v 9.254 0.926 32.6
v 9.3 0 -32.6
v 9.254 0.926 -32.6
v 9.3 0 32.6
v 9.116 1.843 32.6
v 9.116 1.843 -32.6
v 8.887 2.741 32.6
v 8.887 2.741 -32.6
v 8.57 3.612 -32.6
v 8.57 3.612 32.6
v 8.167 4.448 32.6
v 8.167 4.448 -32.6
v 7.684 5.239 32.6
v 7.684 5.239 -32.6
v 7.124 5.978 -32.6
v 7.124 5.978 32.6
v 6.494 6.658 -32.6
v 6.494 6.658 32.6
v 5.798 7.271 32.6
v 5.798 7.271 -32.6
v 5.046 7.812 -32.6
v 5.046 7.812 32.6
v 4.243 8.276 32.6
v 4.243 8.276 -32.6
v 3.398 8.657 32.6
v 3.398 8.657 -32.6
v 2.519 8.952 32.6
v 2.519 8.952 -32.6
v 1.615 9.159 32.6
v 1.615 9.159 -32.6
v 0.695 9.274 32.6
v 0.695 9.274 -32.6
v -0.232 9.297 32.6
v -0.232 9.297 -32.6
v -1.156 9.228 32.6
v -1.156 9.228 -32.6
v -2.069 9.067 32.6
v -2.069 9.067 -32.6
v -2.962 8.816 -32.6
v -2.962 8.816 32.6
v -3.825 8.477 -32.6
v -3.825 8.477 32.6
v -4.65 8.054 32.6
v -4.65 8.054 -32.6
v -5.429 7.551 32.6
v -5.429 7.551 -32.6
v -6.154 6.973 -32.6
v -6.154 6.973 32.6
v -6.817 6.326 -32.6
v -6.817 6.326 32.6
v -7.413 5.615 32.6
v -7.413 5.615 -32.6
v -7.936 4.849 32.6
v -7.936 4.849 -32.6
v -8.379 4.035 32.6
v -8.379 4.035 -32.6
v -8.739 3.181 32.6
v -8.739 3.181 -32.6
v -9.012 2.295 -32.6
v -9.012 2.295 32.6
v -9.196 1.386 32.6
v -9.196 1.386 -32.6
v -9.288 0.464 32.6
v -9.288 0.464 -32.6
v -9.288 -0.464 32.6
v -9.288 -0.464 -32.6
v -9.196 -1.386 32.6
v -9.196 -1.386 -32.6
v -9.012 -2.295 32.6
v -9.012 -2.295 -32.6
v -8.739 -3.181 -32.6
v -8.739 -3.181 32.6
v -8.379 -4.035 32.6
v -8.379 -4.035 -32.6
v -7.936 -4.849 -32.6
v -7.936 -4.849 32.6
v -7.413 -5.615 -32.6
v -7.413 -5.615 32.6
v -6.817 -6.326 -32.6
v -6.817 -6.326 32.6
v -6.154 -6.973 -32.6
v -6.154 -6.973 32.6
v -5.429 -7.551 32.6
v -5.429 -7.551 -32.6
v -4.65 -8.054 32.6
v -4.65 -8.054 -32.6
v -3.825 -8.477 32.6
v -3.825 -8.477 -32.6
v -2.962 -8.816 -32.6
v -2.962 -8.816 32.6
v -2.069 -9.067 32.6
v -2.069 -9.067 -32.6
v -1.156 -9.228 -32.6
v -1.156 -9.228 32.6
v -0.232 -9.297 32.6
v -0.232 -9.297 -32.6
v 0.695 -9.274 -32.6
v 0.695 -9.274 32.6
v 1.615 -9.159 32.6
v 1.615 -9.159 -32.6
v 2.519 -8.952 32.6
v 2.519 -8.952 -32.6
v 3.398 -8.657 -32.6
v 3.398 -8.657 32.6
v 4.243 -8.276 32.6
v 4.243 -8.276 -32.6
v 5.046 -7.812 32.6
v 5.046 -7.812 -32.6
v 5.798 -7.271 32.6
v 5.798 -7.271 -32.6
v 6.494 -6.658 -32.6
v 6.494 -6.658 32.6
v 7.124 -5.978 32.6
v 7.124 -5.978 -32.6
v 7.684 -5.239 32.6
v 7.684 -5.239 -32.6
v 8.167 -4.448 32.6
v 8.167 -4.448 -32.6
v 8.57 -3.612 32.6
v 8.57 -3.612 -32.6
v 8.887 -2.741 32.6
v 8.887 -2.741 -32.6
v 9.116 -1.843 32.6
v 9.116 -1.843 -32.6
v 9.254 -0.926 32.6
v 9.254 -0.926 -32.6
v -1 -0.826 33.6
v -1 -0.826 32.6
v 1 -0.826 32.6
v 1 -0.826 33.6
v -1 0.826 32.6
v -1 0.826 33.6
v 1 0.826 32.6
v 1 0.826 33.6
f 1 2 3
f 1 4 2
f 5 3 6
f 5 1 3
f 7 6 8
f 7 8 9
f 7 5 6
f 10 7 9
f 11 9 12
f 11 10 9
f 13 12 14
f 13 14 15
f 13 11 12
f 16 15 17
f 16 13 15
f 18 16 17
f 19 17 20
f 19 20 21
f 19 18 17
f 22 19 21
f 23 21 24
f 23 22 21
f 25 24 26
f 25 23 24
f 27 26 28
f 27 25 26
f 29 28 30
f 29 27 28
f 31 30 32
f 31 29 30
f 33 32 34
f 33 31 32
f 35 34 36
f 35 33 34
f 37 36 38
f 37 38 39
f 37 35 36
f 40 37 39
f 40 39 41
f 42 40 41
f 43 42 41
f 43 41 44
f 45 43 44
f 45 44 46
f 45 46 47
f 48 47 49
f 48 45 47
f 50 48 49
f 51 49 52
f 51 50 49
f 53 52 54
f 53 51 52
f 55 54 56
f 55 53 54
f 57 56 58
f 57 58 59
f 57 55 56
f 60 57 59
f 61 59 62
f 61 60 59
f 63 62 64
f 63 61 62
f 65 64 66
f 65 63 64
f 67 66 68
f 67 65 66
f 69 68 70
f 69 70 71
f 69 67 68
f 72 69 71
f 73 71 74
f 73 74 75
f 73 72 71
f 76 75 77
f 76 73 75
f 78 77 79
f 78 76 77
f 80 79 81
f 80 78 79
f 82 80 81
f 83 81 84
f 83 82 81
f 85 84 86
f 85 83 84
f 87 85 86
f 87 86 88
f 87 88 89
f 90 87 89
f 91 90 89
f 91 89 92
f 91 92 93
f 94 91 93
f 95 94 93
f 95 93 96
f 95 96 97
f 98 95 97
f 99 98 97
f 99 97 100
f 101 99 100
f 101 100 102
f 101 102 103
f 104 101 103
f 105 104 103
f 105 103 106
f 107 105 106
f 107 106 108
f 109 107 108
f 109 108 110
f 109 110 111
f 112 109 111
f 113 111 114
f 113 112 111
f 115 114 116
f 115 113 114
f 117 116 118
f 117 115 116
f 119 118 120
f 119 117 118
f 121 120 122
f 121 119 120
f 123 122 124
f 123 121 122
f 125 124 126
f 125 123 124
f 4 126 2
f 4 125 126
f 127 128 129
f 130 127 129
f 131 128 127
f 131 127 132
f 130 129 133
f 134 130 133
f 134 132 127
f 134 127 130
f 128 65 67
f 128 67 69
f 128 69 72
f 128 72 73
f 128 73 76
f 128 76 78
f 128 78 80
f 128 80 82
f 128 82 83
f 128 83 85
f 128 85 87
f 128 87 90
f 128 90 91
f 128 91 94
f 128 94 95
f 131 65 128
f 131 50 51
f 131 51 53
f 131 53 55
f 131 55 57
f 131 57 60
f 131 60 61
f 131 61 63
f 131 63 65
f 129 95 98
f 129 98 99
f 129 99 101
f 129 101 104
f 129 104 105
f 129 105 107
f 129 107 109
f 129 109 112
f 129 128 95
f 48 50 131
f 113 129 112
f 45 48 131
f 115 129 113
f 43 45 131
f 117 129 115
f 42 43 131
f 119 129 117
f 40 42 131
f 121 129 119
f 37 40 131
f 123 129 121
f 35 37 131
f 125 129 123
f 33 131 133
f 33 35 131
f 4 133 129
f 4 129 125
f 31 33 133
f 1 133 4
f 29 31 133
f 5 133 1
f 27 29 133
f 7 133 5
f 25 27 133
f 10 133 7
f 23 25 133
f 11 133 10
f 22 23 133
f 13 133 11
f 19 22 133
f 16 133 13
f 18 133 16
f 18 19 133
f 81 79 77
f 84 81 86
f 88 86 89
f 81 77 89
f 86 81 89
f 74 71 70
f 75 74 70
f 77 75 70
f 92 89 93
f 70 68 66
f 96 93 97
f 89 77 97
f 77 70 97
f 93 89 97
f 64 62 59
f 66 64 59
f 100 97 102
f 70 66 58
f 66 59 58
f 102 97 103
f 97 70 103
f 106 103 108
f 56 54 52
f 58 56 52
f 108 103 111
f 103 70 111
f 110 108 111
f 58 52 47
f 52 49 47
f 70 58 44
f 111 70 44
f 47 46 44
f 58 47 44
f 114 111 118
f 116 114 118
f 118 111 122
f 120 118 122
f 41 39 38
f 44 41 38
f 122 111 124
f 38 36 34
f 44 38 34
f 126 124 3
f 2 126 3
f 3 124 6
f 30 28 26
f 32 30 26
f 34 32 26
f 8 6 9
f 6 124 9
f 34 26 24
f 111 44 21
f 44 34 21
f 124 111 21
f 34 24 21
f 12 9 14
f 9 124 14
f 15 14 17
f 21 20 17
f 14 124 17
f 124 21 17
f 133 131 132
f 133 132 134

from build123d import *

# Parameters (mm, degrees)
SKETCH_1_R      = 9.3
EXTRUDE_1_DEPTH = 32.6
SKETCH_2_W      = 2
SKETCH_2_H      = 1.651721756
EXTRUDE_2_DEPTH = 1


with BuildPart() as part:
    # Эскиз1 → Бобышка-Вытянуть1 (new, symmetric)
    with BuildSketch(Plane.XY):
        Circle(SKETCH_1_R)
    extrude(amount=EXTRUDE_1_DEPTH, both=True)

    # Эскиз2 → Бобышка-Вытянуть2 (add)
    with BuildSketch(Plane.XY.offset(32.6)):
        Rectangle(SKETCH_2_W, SKETCH_2_H)
    extrude(amount=EXTRUDE_2_DEPTH)


solid = part.part
